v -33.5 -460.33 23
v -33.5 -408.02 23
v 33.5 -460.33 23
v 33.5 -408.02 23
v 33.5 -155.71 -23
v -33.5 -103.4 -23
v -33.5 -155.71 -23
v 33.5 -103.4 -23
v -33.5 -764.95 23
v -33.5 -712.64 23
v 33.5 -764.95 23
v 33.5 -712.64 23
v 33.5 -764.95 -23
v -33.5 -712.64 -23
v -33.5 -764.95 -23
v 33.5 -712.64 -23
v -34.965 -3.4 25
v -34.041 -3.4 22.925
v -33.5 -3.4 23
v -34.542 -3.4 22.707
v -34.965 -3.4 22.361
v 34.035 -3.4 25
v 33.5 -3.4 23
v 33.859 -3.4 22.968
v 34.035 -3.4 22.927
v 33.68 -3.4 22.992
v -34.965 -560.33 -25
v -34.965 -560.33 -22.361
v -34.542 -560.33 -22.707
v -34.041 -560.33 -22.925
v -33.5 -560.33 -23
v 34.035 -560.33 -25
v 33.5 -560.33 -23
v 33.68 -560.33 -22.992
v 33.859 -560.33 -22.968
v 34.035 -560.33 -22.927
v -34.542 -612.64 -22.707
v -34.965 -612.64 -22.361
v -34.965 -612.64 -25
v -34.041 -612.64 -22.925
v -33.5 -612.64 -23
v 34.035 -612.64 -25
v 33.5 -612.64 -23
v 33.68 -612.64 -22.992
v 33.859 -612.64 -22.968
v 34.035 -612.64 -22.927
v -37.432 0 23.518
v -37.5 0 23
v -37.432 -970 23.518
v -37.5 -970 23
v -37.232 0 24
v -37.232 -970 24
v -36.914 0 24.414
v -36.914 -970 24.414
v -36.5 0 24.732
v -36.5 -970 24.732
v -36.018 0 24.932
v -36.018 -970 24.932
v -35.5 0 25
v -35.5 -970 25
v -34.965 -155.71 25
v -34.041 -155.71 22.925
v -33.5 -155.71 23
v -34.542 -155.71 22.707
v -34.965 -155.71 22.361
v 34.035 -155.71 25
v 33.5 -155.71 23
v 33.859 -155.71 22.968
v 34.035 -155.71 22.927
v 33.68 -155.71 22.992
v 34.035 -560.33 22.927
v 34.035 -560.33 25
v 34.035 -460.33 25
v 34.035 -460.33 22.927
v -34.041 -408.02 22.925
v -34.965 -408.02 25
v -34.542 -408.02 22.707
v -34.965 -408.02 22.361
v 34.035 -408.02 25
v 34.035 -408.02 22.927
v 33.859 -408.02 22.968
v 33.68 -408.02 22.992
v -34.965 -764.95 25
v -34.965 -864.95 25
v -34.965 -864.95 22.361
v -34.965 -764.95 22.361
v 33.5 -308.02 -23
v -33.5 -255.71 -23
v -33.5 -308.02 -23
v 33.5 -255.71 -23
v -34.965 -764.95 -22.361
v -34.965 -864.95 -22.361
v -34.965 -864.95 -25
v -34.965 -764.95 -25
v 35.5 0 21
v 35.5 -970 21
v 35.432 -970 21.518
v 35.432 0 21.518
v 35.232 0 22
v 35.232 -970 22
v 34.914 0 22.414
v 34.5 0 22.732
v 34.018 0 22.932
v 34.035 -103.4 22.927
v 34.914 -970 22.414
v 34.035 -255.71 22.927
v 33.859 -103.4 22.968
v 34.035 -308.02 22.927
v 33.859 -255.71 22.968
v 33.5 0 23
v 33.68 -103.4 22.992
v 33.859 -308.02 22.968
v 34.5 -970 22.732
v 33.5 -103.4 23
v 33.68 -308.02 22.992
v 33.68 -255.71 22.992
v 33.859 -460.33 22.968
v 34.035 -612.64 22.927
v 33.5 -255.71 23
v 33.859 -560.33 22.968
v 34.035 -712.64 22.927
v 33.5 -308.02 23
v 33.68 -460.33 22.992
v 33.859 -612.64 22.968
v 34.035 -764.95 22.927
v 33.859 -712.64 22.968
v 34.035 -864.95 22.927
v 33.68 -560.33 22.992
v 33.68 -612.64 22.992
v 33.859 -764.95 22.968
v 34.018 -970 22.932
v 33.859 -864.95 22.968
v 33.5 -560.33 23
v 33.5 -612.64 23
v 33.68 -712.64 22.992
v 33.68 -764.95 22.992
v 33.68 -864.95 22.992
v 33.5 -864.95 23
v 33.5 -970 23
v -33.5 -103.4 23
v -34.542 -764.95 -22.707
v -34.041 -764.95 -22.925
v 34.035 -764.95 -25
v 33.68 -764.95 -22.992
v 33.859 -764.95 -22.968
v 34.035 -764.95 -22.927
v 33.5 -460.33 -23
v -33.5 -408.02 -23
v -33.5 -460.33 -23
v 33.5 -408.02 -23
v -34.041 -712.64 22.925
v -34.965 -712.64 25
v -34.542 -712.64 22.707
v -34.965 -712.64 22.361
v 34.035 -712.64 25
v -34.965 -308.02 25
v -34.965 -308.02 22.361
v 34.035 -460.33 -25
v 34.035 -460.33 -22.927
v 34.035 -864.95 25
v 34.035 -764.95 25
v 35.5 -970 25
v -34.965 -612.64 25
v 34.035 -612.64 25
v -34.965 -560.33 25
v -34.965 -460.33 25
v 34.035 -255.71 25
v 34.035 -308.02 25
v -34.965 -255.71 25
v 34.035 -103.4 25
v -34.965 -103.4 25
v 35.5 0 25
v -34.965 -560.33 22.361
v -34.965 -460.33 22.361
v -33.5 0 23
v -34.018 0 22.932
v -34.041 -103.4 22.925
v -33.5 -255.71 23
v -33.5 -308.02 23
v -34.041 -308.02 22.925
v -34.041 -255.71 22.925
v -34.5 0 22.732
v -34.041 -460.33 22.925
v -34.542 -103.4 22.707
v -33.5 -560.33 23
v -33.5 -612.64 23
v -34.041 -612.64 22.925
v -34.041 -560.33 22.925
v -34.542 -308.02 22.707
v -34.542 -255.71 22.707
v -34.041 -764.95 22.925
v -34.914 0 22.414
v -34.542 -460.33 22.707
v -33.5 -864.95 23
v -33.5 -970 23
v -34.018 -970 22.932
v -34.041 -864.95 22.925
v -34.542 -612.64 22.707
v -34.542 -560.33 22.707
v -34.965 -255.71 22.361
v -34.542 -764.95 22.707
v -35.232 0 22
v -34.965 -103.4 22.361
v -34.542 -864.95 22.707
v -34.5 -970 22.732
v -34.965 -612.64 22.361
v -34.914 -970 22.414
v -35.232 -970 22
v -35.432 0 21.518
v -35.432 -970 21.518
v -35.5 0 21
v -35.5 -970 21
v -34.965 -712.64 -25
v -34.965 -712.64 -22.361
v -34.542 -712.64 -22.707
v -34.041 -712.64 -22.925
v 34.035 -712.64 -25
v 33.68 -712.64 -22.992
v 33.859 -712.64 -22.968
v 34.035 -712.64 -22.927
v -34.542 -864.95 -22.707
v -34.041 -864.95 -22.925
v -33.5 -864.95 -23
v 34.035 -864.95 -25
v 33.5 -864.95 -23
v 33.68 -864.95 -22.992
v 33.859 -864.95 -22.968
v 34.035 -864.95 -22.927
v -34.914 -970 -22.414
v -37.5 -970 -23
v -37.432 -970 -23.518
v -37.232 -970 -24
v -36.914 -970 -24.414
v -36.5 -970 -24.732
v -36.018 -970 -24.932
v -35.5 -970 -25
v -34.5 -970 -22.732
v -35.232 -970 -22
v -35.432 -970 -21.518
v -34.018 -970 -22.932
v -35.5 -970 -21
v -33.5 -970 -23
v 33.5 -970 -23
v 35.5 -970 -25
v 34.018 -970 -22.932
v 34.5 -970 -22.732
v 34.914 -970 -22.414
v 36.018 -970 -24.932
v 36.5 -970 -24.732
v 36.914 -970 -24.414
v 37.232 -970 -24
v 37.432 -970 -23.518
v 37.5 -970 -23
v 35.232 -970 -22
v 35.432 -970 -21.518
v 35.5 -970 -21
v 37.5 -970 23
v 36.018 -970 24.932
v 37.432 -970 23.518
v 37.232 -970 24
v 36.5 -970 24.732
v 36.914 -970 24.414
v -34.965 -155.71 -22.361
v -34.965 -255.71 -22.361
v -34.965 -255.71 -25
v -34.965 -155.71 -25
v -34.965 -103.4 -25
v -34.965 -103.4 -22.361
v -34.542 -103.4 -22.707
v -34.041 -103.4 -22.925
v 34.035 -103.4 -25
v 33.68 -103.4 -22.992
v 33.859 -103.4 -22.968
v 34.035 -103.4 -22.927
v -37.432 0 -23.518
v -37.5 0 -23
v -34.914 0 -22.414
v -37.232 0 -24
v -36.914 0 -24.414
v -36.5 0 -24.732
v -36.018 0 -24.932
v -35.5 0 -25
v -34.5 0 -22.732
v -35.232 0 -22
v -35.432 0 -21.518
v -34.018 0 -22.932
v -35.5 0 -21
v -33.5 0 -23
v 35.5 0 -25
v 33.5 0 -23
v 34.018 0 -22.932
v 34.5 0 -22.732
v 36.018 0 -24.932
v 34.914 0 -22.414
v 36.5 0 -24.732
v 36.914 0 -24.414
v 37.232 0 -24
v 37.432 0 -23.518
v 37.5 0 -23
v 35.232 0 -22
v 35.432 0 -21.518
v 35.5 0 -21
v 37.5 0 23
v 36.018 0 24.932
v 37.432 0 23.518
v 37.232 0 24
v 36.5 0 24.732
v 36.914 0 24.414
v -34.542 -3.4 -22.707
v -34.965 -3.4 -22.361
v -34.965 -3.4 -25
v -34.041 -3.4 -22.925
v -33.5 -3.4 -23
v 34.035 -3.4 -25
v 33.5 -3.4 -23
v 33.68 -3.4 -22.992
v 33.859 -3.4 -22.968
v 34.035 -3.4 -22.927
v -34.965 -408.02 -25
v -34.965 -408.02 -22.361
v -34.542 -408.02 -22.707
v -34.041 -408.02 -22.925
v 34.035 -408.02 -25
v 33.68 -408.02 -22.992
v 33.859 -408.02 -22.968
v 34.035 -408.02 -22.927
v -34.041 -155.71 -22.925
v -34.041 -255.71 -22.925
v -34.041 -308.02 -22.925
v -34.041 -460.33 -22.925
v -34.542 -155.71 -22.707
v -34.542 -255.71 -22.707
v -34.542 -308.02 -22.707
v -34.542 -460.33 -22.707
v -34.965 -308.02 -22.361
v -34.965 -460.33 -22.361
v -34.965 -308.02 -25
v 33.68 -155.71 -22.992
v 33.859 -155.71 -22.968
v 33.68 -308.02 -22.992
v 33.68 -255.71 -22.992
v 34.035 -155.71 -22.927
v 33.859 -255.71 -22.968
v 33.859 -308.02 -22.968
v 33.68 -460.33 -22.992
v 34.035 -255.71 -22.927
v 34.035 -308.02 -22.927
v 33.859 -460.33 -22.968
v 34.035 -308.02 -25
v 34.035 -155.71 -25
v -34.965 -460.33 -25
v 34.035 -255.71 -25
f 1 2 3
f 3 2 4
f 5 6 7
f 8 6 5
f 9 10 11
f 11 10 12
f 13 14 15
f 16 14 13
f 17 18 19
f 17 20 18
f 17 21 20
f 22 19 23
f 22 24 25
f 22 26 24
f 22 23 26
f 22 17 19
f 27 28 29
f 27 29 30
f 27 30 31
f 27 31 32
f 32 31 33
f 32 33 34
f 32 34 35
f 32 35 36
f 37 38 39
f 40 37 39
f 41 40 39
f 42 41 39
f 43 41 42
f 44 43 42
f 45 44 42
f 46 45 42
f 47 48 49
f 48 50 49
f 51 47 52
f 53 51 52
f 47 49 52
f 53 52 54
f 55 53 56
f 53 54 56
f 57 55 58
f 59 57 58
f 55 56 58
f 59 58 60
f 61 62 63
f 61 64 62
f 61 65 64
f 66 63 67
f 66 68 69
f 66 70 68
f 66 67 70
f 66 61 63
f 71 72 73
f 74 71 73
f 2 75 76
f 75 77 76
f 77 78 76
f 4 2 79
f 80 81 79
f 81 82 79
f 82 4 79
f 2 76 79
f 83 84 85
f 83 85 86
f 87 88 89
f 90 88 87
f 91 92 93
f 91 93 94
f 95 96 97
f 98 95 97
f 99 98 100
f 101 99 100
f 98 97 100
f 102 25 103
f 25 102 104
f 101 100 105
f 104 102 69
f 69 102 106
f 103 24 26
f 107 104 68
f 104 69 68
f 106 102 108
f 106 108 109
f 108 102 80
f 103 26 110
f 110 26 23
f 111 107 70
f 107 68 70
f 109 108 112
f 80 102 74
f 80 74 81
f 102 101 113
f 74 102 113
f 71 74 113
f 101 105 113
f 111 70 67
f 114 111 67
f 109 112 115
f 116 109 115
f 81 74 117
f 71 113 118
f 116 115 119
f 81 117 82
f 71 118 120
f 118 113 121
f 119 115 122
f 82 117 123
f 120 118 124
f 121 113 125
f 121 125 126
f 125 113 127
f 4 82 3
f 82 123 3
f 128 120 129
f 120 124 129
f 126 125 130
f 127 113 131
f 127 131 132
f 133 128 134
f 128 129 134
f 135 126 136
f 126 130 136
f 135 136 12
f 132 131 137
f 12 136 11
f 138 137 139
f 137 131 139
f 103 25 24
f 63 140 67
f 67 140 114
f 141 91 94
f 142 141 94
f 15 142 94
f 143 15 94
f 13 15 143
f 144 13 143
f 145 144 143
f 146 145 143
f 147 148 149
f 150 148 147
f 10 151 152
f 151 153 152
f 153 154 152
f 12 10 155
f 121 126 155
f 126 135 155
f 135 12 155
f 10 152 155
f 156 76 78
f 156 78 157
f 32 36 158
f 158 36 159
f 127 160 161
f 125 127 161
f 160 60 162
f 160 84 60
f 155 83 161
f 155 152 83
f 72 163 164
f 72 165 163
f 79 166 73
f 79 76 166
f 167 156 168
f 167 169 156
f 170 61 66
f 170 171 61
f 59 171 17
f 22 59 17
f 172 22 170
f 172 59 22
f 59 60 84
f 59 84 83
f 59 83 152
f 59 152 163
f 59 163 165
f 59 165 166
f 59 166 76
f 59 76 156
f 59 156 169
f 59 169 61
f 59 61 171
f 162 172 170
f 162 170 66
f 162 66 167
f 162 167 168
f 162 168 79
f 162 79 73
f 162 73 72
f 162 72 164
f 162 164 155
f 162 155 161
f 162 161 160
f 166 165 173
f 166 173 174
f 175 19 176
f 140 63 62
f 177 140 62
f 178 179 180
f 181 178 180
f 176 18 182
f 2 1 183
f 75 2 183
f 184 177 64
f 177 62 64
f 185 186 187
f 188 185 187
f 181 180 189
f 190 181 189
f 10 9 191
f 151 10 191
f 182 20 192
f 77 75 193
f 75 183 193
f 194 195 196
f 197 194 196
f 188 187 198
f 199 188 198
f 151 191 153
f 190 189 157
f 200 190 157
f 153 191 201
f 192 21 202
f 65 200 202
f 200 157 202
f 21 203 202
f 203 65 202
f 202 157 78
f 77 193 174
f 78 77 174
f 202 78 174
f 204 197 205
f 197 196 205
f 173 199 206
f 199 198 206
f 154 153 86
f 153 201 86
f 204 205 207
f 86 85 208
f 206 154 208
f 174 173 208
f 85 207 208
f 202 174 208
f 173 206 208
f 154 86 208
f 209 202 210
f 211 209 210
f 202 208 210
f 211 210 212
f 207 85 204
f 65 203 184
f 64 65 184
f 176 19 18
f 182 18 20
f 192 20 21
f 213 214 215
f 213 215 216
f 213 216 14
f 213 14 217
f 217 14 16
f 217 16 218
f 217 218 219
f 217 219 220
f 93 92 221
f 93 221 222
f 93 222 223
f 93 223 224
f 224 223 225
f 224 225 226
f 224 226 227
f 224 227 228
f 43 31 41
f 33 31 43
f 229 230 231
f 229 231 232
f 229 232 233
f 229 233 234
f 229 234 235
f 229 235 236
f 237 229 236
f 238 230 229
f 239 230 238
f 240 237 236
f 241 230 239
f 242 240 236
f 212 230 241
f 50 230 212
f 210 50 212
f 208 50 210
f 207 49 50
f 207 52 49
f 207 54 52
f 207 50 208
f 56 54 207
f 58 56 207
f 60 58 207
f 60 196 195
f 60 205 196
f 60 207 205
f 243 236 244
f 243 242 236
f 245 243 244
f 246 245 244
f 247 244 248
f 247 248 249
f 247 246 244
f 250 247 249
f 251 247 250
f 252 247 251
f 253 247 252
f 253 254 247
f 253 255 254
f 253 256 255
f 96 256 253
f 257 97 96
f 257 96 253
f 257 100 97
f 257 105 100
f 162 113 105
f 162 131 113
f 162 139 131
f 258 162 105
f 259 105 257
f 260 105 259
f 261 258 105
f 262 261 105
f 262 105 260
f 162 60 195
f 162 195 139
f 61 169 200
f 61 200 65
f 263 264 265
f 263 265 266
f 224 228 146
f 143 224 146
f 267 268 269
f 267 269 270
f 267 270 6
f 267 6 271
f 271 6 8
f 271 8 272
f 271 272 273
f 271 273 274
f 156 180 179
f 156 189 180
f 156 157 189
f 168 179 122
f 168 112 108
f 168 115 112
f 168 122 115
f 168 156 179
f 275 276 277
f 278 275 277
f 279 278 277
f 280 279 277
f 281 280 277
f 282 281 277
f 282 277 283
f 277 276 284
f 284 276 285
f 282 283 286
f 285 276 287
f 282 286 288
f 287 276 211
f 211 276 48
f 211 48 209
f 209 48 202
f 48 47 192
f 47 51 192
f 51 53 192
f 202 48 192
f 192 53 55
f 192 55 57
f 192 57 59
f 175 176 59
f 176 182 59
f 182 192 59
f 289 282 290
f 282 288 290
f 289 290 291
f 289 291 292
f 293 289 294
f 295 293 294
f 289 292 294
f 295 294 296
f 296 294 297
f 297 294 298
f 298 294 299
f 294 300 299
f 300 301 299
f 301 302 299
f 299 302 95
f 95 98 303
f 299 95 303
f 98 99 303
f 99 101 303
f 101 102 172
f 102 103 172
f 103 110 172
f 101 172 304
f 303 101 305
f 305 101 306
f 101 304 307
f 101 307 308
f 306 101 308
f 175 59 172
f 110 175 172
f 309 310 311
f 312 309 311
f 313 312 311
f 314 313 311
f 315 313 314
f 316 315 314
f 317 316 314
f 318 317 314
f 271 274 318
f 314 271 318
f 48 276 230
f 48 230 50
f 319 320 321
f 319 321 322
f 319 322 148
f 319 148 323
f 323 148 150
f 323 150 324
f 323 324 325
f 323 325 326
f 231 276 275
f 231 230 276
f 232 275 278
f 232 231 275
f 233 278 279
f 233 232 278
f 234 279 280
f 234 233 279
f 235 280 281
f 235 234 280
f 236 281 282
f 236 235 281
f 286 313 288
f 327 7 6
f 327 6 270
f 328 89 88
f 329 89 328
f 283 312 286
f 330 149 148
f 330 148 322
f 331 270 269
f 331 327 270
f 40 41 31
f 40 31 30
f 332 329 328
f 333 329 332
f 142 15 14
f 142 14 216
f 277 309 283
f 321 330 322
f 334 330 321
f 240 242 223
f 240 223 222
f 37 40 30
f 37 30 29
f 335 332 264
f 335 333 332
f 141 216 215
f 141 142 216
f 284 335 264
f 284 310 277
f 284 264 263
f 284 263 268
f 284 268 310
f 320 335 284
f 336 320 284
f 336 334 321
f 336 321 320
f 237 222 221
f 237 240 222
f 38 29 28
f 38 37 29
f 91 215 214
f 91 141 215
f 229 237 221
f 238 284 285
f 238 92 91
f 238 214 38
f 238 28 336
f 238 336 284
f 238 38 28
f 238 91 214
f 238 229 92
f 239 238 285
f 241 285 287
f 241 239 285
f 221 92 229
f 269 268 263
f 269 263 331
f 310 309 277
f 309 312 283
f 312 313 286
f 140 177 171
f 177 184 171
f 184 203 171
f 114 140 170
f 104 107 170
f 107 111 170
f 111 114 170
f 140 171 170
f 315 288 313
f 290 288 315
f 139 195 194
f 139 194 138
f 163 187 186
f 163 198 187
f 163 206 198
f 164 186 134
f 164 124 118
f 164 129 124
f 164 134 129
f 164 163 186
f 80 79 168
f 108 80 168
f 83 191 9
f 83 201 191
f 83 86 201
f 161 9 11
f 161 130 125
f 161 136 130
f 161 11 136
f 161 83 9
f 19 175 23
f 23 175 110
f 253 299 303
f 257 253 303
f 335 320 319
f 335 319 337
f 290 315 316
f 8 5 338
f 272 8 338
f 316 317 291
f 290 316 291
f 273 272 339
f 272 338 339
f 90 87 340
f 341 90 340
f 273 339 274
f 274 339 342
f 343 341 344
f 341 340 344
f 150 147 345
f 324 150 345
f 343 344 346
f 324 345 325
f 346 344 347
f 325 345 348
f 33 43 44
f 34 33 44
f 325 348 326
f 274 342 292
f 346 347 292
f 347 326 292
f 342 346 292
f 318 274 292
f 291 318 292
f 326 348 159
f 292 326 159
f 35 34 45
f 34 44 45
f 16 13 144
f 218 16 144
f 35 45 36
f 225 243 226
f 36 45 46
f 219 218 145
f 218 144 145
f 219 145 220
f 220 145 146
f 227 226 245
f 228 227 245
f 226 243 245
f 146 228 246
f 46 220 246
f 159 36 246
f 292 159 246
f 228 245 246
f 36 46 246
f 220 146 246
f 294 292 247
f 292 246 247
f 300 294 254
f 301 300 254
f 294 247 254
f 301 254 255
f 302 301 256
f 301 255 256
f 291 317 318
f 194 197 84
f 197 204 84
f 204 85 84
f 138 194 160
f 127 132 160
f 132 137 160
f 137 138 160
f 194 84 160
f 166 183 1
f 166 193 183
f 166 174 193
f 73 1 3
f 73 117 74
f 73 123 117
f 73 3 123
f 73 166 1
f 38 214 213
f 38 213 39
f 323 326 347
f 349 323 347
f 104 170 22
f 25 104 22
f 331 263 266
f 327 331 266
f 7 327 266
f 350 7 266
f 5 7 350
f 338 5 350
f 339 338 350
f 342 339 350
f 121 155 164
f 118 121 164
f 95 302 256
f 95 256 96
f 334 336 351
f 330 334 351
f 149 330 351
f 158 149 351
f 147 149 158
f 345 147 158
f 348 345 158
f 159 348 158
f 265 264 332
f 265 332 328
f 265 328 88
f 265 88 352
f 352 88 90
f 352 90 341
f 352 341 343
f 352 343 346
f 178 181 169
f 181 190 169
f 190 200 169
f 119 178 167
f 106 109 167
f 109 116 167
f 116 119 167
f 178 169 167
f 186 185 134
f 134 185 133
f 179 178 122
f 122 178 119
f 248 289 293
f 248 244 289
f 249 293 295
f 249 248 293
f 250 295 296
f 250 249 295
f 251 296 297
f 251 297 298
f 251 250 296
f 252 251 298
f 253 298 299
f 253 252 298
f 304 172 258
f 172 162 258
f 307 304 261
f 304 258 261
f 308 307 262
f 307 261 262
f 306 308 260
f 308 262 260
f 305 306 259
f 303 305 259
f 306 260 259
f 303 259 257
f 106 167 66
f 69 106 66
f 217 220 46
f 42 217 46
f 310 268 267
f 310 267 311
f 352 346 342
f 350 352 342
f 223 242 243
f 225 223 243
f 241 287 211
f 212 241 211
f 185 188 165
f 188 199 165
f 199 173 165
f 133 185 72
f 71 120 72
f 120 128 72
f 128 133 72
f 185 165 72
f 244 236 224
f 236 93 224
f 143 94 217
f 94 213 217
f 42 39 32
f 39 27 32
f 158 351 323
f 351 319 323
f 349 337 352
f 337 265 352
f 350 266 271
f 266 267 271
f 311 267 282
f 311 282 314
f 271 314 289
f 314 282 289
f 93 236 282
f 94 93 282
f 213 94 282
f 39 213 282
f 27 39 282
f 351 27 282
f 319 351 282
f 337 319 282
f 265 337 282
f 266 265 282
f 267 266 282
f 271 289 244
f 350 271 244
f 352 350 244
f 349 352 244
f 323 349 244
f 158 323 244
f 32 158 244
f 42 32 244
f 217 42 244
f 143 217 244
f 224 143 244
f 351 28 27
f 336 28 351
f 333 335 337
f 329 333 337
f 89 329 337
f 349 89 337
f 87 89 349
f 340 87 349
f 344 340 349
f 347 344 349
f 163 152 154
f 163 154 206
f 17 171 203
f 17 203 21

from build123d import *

# Parameters (mm, degrees)
F0_W     = 75
F0_H     = 50
F0_W_2   = 71
F0_H_2   = 46
F1_DEPTH = 970
F3_R     = 2
F4_R     = 2
F2_W     = 69
F2_H     = 100
F5_DEPTH = 60


with BuildPart() as f1:
    # F0 (on Front) → F1 (new body)
    with BuildSketch(Plane.XZ):
        Rectangle(F0_W, F0_H)
        Rectangle(F0_W_2, F0_H_2, mode=Mode.SUBTRACT)
    extrude(amount=F1_DEPTH)

    # F3
    f3_edges = [f1.edges().sort_by_distance(p)[0] for p in [
        (-37.5, -485, 25),
        (37.5, -485, 25),
        (37.5, -485, -25),
        (-37.5, -485, -25),
    ]]
    fillet(f3_edges, radius=F3_R)

    # F4
    f4_edges = [f1.edges().sort_by_distance(p)[0] for p in [
        (-35.5, -485, 23),
        (-35.5, -485, -23),
        (35.5, -485, -23),
        (35.5, -485, 23),
    ]]
    fillet(f4_edges, radius=F4_R)

    # F2 (on face) → F5 (cut)
    with BuildSketch(Plane.XY.offset(25)):
        with Locations((-0.465244, -814.95)):
            Rectangle(F2_W, F2_H)
        with Locations((-0.465244, -662.64)):
            Rectangle(F2_W, F2_H)
        with Locations((-0.465244, -510.33)):
            Rectangle(F2_W, F2_H)
        with Locations((-0.465244, -358.02)):
            Rectangle(F2_W, F2_H)
        with Locations((-0.465244, -205.71)):
            Rectangle(F2_W, F2_H)
        with Locations((-0.465244, -53.4)):
            Rectangle(F2_W, F2_H)
    extrude(amount=-F5_DEPTH, mode=Mode.SUBTRACT)


solid = f1.part
